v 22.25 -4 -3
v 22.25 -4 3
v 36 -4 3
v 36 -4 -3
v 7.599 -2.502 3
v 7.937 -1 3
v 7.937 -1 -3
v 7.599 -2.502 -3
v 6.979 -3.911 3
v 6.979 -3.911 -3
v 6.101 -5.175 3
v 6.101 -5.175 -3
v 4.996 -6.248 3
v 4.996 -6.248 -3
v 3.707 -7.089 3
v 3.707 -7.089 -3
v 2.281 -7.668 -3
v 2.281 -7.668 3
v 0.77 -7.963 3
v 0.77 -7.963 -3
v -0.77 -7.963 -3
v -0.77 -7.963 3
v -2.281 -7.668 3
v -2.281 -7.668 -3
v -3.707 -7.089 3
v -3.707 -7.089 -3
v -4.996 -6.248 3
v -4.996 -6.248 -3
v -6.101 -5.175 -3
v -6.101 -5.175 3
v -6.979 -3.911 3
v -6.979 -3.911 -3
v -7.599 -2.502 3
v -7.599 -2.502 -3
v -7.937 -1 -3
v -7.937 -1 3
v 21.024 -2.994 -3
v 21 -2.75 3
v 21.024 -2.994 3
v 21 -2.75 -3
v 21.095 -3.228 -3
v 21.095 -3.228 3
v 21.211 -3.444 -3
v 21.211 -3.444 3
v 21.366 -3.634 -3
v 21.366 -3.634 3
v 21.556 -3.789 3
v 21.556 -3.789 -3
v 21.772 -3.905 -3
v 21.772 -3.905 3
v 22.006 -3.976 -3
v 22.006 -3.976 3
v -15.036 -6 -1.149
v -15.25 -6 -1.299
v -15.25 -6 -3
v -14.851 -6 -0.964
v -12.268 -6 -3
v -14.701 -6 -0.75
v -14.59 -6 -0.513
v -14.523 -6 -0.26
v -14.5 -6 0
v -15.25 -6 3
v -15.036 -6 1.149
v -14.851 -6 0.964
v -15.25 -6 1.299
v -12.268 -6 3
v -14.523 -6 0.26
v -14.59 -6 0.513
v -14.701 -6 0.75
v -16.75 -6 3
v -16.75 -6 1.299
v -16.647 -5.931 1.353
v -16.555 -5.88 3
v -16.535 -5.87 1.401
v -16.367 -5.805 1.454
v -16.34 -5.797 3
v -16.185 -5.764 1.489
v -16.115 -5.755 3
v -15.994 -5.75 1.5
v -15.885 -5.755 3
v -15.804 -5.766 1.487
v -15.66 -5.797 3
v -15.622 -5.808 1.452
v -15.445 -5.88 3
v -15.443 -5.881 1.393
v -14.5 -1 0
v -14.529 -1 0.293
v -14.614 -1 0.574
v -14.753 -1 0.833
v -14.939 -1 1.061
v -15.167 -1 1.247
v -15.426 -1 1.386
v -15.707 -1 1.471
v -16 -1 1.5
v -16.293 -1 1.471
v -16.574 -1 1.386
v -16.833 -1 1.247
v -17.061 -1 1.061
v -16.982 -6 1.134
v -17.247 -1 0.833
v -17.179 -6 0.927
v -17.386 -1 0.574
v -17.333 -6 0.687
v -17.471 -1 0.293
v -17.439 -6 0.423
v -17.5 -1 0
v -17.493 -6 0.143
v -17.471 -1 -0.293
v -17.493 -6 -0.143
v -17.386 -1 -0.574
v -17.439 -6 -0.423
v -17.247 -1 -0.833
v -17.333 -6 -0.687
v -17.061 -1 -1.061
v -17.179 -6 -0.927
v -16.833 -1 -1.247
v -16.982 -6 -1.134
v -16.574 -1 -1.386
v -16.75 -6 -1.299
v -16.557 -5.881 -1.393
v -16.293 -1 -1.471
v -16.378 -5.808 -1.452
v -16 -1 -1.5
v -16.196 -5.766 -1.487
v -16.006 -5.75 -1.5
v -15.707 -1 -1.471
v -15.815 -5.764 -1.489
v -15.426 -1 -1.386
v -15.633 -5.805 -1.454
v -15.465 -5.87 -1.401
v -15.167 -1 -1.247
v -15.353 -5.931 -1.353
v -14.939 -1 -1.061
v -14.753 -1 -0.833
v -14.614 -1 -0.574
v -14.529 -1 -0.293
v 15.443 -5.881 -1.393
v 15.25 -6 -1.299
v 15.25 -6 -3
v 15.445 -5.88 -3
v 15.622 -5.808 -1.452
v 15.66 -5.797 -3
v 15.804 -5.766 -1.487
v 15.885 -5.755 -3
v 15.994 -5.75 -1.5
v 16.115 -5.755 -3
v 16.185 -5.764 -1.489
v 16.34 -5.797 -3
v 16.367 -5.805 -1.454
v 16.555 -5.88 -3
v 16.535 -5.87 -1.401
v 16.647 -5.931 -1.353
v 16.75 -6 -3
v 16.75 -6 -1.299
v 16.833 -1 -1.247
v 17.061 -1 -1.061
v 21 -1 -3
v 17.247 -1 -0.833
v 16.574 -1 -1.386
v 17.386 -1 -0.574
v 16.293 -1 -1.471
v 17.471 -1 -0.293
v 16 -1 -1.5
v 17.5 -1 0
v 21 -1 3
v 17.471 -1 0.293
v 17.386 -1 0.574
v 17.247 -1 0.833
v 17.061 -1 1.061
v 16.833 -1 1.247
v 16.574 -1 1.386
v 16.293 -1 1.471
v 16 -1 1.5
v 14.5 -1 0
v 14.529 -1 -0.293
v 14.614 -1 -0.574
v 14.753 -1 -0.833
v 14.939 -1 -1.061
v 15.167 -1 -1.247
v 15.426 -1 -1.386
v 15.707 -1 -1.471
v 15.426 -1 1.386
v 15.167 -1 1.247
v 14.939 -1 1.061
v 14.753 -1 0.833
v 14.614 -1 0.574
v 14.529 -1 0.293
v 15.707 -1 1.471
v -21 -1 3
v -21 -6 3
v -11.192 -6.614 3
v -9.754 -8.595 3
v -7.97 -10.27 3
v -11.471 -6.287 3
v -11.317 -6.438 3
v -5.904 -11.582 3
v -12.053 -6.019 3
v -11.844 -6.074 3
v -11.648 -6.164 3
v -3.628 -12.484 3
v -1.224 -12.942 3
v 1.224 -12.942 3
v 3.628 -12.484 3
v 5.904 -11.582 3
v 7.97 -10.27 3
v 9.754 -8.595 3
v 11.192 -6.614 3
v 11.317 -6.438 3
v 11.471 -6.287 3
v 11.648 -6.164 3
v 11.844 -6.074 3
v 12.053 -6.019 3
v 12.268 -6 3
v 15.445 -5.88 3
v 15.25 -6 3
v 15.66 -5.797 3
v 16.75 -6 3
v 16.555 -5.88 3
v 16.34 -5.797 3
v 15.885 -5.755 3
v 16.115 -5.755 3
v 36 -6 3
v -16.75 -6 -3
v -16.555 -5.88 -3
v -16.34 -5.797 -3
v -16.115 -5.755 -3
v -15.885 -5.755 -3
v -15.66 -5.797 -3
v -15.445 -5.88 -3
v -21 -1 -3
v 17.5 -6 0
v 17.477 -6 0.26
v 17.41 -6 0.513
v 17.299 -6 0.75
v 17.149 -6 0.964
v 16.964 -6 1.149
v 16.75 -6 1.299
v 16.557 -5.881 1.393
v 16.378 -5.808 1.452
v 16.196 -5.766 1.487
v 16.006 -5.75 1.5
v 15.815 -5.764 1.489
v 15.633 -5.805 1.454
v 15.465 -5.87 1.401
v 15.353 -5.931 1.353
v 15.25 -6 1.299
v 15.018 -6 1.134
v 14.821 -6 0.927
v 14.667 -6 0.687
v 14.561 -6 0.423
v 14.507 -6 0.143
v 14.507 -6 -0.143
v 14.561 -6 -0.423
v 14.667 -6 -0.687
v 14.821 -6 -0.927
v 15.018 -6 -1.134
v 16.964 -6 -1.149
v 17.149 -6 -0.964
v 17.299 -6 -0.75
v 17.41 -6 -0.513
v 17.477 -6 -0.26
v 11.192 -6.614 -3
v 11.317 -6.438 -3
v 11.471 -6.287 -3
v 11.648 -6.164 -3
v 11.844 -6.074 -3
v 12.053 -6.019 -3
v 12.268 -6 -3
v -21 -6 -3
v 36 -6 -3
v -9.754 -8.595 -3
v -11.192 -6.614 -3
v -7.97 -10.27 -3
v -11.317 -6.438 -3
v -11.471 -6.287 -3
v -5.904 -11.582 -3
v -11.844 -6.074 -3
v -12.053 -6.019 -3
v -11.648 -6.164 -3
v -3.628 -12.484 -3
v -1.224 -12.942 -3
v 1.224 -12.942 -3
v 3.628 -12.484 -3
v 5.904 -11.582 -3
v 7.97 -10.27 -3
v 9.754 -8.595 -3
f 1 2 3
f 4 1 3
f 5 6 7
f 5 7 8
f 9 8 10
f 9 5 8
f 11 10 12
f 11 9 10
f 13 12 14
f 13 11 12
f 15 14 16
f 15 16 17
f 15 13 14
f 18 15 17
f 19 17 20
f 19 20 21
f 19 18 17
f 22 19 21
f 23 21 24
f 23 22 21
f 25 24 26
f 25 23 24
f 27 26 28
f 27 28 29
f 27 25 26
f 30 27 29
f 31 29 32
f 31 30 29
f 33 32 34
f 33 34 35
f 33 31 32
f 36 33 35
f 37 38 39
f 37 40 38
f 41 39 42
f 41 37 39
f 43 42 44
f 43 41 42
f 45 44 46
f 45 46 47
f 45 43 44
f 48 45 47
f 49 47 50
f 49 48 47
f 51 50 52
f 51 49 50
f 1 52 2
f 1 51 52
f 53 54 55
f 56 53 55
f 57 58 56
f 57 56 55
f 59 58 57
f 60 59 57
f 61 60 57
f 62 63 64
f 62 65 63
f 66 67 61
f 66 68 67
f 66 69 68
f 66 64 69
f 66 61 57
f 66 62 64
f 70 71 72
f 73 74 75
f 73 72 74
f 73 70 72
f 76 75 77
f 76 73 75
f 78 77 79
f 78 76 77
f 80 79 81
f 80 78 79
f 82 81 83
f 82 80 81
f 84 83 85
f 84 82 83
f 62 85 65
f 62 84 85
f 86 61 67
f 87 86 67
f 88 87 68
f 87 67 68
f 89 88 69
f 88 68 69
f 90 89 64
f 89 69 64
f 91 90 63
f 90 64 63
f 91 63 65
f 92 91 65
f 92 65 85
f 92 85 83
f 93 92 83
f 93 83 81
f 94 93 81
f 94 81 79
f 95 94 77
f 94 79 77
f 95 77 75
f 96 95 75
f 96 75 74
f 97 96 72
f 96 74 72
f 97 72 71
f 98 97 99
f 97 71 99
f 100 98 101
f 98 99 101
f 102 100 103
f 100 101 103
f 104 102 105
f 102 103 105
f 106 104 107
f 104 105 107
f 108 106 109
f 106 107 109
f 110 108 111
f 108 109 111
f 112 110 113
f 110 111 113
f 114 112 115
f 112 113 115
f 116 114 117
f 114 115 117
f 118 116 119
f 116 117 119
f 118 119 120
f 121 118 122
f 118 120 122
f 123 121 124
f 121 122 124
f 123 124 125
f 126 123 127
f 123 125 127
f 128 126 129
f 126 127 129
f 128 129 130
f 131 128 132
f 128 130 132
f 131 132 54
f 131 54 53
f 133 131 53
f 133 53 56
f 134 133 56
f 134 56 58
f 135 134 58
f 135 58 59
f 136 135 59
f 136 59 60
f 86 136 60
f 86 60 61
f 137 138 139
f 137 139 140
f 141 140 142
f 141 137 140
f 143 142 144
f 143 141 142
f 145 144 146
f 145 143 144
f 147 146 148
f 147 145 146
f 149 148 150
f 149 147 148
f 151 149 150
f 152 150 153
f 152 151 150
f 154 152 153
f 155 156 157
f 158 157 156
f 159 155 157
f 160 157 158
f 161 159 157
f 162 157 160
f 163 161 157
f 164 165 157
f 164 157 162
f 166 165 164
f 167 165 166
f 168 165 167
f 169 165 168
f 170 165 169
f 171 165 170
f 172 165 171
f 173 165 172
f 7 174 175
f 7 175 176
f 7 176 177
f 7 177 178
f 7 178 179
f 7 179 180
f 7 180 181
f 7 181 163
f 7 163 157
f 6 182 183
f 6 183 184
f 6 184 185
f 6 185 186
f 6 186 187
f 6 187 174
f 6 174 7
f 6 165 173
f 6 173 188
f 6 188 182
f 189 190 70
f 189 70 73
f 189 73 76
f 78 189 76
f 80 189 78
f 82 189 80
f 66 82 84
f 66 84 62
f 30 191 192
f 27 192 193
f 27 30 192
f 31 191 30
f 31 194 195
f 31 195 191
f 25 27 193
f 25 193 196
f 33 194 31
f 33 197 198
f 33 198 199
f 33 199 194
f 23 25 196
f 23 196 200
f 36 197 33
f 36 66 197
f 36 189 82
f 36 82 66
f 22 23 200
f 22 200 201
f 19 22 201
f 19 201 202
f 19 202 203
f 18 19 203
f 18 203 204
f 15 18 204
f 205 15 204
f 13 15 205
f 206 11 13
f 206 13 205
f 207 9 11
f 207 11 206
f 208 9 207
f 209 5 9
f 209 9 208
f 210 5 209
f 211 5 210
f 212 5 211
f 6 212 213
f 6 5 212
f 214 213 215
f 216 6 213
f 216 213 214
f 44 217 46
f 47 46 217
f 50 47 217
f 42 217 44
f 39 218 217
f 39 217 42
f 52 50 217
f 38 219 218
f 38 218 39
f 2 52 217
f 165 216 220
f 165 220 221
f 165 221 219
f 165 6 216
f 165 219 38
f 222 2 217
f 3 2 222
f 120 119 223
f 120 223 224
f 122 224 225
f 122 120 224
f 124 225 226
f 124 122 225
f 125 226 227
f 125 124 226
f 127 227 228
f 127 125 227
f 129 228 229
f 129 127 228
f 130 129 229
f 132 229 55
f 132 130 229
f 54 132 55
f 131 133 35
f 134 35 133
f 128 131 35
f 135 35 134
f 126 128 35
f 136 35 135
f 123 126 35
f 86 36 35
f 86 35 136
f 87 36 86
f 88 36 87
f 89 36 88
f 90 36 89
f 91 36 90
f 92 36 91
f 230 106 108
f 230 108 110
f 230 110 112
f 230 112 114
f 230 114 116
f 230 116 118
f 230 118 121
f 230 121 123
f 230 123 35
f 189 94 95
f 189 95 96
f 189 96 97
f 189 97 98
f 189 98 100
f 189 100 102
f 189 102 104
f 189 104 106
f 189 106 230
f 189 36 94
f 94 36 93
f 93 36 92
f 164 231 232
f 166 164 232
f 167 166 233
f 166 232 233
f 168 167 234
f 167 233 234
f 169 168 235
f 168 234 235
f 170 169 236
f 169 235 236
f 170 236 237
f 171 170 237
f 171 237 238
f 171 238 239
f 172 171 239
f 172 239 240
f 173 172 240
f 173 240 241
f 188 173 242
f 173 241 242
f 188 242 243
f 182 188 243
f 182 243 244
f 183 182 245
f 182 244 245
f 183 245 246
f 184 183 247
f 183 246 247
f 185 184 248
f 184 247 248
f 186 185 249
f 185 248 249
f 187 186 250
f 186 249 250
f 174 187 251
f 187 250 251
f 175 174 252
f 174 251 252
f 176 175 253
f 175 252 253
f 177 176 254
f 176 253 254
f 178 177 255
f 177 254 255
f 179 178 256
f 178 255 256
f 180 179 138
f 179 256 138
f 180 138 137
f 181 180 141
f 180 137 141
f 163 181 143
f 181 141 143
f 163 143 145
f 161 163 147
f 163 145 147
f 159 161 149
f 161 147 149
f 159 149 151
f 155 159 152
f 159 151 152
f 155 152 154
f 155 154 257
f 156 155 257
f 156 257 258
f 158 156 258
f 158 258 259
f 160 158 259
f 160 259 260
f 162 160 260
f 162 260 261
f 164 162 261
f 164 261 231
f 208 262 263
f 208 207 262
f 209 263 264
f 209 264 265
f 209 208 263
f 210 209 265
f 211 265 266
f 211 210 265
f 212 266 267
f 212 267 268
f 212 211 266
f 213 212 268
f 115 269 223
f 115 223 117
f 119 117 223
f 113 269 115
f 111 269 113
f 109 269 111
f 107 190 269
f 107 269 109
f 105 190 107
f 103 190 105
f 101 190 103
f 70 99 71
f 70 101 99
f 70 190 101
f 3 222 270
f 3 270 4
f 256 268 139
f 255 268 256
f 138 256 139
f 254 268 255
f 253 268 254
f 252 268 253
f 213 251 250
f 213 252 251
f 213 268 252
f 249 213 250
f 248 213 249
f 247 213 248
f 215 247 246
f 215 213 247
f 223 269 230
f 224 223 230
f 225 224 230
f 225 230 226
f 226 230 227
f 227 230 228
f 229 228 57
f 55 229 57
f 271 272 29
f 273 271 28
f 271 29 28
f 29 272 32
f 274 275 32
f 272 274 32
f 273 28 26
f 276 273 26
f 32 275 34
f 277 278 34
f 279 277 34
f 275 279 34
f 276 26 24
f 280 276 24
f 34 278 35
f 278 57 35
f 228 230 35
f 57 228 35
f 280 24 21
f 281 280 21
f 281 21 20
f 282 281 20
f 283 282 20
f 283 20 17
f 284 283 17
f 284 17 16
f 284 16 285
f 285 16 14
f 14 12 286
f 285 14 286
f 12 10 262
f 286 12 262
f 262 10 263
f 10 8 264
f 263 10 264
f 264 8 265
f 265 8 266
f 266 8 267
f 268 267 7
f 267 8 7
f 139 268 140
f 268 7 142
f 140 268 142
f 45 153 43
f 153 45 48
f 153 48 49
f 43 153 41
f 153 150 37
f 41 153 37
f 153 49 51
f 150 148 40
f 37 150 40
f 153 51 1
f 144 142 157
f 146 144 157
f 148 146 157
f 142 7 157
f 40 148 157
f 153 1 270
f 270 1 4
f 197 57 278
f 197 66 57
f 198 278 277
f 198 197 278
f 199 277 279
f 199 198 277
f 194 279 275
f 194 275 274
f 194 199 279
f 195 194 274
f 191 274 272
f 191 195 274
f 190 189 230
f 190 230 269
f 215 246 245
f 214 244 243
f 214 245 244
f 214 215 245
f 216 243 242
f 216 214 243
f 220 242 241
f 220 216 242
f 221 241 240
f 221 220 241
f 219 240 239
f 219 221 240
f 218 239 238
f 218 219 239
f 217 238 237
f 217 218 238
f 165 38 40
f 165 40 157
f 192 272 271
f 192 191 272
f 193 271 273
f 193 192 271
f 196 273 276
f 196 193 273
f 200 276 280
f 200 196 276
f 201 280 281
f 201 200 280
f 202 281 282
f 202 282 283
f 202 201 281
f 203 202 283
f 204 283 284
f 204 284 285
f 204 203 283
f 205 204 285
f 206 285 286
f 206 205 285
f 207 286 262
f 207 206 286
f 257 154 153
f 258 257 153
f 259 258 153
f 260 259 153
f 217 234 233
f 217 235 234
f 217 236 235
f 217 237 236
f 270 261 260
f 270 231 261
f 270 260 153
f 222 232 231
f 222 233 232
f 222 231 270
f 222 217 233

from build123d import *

# Parameters (mm, degrees)
EXTRUDE_1_DEPTH     = 3
SKETCH_3_R          = 1.5
CUT_EXTRUDE_1_DEPTH = 37.796738986
SKETCH_4_W          = 15
SKETCH_4_H          = 3
CUT_EXTRUDE_2_DEPTH = 39.742741271
FILLET_1_R          = 1.25


with BuildPart() as part:
    # ｽｹｯﾁ1 → ﾎﾞｽ - 押し出し1 (new, symmetric)
    with BuildSketch(Plane.XY):
        with BuildLine():
            Line((-15.25, -6), (-11.532562595, -6))
            ThreePointArc((-11.532562595, -6), (0, -13), (11.532562595, -6))
            Line((11.532562595, -6), (15.25, -6))
            ThreePointArc((15.25, -6), (16, -5.75), (16.75, -6))
            Line((16.75, -6), (36, -6))
            Line((36, -6), (36, -1))
            Line((36, -1), (7.937253933, -1))
            ThreePointArc((7.937253933, -1), (0, -8), (-7.937253933, -1))
            Line((-7.937253933, -1), (-21, -1))
            Line((-21, -1), (-21, -6))
            Line((-21, -6), (-16.75, -6))
            ThreePointArc((-16.75, -6), (-16, -5.75), (-15.25, -6))
        make_face()
    extrude(amount=EXTRUDE_1_DEPTH, both=True)

    # ｽｹｯﾁ3 → ｶｯﾄ - 押し出し1 (cut, through all)
    with BuildSketch(Plane.XZ.offset(6)):
        with Locations((-16, 0)):
            Circle(SKETCH_3_R)
        with Locations((16, 0)):
            Circle(SKETCH_3_R)
    extrude(amount=-CUT_EXTRUDE_1_DEPTH, mode=Mode.SUBTRACT)

    # ｽｹｯﾁ4 → ｶｯﾄ - 押し出し2 (cut, through all)
    with BuildSketch(Plane.XY.offset(3)):
        with Locations((28.5, -2.5)):
            Rectangle(SKETCH_4_W, SKETCH_4_H)
    extrude(amount=-CUT_EXTRUDE_2_DEPTH, mode=Mode.SUBTRACT)

    # ﾌｨﾚｯﾄ1
    fillet_1_edges = [part.edges().sort_by_distance(p)[0] for p in [
        (11.532562595, -6, 0),
        (-11.532562595, -6, 0),
        (21, -4, 0),
    ]]
    fillet(fillet_1_edges, radius=FILLET_1_R)


solid = part.part
